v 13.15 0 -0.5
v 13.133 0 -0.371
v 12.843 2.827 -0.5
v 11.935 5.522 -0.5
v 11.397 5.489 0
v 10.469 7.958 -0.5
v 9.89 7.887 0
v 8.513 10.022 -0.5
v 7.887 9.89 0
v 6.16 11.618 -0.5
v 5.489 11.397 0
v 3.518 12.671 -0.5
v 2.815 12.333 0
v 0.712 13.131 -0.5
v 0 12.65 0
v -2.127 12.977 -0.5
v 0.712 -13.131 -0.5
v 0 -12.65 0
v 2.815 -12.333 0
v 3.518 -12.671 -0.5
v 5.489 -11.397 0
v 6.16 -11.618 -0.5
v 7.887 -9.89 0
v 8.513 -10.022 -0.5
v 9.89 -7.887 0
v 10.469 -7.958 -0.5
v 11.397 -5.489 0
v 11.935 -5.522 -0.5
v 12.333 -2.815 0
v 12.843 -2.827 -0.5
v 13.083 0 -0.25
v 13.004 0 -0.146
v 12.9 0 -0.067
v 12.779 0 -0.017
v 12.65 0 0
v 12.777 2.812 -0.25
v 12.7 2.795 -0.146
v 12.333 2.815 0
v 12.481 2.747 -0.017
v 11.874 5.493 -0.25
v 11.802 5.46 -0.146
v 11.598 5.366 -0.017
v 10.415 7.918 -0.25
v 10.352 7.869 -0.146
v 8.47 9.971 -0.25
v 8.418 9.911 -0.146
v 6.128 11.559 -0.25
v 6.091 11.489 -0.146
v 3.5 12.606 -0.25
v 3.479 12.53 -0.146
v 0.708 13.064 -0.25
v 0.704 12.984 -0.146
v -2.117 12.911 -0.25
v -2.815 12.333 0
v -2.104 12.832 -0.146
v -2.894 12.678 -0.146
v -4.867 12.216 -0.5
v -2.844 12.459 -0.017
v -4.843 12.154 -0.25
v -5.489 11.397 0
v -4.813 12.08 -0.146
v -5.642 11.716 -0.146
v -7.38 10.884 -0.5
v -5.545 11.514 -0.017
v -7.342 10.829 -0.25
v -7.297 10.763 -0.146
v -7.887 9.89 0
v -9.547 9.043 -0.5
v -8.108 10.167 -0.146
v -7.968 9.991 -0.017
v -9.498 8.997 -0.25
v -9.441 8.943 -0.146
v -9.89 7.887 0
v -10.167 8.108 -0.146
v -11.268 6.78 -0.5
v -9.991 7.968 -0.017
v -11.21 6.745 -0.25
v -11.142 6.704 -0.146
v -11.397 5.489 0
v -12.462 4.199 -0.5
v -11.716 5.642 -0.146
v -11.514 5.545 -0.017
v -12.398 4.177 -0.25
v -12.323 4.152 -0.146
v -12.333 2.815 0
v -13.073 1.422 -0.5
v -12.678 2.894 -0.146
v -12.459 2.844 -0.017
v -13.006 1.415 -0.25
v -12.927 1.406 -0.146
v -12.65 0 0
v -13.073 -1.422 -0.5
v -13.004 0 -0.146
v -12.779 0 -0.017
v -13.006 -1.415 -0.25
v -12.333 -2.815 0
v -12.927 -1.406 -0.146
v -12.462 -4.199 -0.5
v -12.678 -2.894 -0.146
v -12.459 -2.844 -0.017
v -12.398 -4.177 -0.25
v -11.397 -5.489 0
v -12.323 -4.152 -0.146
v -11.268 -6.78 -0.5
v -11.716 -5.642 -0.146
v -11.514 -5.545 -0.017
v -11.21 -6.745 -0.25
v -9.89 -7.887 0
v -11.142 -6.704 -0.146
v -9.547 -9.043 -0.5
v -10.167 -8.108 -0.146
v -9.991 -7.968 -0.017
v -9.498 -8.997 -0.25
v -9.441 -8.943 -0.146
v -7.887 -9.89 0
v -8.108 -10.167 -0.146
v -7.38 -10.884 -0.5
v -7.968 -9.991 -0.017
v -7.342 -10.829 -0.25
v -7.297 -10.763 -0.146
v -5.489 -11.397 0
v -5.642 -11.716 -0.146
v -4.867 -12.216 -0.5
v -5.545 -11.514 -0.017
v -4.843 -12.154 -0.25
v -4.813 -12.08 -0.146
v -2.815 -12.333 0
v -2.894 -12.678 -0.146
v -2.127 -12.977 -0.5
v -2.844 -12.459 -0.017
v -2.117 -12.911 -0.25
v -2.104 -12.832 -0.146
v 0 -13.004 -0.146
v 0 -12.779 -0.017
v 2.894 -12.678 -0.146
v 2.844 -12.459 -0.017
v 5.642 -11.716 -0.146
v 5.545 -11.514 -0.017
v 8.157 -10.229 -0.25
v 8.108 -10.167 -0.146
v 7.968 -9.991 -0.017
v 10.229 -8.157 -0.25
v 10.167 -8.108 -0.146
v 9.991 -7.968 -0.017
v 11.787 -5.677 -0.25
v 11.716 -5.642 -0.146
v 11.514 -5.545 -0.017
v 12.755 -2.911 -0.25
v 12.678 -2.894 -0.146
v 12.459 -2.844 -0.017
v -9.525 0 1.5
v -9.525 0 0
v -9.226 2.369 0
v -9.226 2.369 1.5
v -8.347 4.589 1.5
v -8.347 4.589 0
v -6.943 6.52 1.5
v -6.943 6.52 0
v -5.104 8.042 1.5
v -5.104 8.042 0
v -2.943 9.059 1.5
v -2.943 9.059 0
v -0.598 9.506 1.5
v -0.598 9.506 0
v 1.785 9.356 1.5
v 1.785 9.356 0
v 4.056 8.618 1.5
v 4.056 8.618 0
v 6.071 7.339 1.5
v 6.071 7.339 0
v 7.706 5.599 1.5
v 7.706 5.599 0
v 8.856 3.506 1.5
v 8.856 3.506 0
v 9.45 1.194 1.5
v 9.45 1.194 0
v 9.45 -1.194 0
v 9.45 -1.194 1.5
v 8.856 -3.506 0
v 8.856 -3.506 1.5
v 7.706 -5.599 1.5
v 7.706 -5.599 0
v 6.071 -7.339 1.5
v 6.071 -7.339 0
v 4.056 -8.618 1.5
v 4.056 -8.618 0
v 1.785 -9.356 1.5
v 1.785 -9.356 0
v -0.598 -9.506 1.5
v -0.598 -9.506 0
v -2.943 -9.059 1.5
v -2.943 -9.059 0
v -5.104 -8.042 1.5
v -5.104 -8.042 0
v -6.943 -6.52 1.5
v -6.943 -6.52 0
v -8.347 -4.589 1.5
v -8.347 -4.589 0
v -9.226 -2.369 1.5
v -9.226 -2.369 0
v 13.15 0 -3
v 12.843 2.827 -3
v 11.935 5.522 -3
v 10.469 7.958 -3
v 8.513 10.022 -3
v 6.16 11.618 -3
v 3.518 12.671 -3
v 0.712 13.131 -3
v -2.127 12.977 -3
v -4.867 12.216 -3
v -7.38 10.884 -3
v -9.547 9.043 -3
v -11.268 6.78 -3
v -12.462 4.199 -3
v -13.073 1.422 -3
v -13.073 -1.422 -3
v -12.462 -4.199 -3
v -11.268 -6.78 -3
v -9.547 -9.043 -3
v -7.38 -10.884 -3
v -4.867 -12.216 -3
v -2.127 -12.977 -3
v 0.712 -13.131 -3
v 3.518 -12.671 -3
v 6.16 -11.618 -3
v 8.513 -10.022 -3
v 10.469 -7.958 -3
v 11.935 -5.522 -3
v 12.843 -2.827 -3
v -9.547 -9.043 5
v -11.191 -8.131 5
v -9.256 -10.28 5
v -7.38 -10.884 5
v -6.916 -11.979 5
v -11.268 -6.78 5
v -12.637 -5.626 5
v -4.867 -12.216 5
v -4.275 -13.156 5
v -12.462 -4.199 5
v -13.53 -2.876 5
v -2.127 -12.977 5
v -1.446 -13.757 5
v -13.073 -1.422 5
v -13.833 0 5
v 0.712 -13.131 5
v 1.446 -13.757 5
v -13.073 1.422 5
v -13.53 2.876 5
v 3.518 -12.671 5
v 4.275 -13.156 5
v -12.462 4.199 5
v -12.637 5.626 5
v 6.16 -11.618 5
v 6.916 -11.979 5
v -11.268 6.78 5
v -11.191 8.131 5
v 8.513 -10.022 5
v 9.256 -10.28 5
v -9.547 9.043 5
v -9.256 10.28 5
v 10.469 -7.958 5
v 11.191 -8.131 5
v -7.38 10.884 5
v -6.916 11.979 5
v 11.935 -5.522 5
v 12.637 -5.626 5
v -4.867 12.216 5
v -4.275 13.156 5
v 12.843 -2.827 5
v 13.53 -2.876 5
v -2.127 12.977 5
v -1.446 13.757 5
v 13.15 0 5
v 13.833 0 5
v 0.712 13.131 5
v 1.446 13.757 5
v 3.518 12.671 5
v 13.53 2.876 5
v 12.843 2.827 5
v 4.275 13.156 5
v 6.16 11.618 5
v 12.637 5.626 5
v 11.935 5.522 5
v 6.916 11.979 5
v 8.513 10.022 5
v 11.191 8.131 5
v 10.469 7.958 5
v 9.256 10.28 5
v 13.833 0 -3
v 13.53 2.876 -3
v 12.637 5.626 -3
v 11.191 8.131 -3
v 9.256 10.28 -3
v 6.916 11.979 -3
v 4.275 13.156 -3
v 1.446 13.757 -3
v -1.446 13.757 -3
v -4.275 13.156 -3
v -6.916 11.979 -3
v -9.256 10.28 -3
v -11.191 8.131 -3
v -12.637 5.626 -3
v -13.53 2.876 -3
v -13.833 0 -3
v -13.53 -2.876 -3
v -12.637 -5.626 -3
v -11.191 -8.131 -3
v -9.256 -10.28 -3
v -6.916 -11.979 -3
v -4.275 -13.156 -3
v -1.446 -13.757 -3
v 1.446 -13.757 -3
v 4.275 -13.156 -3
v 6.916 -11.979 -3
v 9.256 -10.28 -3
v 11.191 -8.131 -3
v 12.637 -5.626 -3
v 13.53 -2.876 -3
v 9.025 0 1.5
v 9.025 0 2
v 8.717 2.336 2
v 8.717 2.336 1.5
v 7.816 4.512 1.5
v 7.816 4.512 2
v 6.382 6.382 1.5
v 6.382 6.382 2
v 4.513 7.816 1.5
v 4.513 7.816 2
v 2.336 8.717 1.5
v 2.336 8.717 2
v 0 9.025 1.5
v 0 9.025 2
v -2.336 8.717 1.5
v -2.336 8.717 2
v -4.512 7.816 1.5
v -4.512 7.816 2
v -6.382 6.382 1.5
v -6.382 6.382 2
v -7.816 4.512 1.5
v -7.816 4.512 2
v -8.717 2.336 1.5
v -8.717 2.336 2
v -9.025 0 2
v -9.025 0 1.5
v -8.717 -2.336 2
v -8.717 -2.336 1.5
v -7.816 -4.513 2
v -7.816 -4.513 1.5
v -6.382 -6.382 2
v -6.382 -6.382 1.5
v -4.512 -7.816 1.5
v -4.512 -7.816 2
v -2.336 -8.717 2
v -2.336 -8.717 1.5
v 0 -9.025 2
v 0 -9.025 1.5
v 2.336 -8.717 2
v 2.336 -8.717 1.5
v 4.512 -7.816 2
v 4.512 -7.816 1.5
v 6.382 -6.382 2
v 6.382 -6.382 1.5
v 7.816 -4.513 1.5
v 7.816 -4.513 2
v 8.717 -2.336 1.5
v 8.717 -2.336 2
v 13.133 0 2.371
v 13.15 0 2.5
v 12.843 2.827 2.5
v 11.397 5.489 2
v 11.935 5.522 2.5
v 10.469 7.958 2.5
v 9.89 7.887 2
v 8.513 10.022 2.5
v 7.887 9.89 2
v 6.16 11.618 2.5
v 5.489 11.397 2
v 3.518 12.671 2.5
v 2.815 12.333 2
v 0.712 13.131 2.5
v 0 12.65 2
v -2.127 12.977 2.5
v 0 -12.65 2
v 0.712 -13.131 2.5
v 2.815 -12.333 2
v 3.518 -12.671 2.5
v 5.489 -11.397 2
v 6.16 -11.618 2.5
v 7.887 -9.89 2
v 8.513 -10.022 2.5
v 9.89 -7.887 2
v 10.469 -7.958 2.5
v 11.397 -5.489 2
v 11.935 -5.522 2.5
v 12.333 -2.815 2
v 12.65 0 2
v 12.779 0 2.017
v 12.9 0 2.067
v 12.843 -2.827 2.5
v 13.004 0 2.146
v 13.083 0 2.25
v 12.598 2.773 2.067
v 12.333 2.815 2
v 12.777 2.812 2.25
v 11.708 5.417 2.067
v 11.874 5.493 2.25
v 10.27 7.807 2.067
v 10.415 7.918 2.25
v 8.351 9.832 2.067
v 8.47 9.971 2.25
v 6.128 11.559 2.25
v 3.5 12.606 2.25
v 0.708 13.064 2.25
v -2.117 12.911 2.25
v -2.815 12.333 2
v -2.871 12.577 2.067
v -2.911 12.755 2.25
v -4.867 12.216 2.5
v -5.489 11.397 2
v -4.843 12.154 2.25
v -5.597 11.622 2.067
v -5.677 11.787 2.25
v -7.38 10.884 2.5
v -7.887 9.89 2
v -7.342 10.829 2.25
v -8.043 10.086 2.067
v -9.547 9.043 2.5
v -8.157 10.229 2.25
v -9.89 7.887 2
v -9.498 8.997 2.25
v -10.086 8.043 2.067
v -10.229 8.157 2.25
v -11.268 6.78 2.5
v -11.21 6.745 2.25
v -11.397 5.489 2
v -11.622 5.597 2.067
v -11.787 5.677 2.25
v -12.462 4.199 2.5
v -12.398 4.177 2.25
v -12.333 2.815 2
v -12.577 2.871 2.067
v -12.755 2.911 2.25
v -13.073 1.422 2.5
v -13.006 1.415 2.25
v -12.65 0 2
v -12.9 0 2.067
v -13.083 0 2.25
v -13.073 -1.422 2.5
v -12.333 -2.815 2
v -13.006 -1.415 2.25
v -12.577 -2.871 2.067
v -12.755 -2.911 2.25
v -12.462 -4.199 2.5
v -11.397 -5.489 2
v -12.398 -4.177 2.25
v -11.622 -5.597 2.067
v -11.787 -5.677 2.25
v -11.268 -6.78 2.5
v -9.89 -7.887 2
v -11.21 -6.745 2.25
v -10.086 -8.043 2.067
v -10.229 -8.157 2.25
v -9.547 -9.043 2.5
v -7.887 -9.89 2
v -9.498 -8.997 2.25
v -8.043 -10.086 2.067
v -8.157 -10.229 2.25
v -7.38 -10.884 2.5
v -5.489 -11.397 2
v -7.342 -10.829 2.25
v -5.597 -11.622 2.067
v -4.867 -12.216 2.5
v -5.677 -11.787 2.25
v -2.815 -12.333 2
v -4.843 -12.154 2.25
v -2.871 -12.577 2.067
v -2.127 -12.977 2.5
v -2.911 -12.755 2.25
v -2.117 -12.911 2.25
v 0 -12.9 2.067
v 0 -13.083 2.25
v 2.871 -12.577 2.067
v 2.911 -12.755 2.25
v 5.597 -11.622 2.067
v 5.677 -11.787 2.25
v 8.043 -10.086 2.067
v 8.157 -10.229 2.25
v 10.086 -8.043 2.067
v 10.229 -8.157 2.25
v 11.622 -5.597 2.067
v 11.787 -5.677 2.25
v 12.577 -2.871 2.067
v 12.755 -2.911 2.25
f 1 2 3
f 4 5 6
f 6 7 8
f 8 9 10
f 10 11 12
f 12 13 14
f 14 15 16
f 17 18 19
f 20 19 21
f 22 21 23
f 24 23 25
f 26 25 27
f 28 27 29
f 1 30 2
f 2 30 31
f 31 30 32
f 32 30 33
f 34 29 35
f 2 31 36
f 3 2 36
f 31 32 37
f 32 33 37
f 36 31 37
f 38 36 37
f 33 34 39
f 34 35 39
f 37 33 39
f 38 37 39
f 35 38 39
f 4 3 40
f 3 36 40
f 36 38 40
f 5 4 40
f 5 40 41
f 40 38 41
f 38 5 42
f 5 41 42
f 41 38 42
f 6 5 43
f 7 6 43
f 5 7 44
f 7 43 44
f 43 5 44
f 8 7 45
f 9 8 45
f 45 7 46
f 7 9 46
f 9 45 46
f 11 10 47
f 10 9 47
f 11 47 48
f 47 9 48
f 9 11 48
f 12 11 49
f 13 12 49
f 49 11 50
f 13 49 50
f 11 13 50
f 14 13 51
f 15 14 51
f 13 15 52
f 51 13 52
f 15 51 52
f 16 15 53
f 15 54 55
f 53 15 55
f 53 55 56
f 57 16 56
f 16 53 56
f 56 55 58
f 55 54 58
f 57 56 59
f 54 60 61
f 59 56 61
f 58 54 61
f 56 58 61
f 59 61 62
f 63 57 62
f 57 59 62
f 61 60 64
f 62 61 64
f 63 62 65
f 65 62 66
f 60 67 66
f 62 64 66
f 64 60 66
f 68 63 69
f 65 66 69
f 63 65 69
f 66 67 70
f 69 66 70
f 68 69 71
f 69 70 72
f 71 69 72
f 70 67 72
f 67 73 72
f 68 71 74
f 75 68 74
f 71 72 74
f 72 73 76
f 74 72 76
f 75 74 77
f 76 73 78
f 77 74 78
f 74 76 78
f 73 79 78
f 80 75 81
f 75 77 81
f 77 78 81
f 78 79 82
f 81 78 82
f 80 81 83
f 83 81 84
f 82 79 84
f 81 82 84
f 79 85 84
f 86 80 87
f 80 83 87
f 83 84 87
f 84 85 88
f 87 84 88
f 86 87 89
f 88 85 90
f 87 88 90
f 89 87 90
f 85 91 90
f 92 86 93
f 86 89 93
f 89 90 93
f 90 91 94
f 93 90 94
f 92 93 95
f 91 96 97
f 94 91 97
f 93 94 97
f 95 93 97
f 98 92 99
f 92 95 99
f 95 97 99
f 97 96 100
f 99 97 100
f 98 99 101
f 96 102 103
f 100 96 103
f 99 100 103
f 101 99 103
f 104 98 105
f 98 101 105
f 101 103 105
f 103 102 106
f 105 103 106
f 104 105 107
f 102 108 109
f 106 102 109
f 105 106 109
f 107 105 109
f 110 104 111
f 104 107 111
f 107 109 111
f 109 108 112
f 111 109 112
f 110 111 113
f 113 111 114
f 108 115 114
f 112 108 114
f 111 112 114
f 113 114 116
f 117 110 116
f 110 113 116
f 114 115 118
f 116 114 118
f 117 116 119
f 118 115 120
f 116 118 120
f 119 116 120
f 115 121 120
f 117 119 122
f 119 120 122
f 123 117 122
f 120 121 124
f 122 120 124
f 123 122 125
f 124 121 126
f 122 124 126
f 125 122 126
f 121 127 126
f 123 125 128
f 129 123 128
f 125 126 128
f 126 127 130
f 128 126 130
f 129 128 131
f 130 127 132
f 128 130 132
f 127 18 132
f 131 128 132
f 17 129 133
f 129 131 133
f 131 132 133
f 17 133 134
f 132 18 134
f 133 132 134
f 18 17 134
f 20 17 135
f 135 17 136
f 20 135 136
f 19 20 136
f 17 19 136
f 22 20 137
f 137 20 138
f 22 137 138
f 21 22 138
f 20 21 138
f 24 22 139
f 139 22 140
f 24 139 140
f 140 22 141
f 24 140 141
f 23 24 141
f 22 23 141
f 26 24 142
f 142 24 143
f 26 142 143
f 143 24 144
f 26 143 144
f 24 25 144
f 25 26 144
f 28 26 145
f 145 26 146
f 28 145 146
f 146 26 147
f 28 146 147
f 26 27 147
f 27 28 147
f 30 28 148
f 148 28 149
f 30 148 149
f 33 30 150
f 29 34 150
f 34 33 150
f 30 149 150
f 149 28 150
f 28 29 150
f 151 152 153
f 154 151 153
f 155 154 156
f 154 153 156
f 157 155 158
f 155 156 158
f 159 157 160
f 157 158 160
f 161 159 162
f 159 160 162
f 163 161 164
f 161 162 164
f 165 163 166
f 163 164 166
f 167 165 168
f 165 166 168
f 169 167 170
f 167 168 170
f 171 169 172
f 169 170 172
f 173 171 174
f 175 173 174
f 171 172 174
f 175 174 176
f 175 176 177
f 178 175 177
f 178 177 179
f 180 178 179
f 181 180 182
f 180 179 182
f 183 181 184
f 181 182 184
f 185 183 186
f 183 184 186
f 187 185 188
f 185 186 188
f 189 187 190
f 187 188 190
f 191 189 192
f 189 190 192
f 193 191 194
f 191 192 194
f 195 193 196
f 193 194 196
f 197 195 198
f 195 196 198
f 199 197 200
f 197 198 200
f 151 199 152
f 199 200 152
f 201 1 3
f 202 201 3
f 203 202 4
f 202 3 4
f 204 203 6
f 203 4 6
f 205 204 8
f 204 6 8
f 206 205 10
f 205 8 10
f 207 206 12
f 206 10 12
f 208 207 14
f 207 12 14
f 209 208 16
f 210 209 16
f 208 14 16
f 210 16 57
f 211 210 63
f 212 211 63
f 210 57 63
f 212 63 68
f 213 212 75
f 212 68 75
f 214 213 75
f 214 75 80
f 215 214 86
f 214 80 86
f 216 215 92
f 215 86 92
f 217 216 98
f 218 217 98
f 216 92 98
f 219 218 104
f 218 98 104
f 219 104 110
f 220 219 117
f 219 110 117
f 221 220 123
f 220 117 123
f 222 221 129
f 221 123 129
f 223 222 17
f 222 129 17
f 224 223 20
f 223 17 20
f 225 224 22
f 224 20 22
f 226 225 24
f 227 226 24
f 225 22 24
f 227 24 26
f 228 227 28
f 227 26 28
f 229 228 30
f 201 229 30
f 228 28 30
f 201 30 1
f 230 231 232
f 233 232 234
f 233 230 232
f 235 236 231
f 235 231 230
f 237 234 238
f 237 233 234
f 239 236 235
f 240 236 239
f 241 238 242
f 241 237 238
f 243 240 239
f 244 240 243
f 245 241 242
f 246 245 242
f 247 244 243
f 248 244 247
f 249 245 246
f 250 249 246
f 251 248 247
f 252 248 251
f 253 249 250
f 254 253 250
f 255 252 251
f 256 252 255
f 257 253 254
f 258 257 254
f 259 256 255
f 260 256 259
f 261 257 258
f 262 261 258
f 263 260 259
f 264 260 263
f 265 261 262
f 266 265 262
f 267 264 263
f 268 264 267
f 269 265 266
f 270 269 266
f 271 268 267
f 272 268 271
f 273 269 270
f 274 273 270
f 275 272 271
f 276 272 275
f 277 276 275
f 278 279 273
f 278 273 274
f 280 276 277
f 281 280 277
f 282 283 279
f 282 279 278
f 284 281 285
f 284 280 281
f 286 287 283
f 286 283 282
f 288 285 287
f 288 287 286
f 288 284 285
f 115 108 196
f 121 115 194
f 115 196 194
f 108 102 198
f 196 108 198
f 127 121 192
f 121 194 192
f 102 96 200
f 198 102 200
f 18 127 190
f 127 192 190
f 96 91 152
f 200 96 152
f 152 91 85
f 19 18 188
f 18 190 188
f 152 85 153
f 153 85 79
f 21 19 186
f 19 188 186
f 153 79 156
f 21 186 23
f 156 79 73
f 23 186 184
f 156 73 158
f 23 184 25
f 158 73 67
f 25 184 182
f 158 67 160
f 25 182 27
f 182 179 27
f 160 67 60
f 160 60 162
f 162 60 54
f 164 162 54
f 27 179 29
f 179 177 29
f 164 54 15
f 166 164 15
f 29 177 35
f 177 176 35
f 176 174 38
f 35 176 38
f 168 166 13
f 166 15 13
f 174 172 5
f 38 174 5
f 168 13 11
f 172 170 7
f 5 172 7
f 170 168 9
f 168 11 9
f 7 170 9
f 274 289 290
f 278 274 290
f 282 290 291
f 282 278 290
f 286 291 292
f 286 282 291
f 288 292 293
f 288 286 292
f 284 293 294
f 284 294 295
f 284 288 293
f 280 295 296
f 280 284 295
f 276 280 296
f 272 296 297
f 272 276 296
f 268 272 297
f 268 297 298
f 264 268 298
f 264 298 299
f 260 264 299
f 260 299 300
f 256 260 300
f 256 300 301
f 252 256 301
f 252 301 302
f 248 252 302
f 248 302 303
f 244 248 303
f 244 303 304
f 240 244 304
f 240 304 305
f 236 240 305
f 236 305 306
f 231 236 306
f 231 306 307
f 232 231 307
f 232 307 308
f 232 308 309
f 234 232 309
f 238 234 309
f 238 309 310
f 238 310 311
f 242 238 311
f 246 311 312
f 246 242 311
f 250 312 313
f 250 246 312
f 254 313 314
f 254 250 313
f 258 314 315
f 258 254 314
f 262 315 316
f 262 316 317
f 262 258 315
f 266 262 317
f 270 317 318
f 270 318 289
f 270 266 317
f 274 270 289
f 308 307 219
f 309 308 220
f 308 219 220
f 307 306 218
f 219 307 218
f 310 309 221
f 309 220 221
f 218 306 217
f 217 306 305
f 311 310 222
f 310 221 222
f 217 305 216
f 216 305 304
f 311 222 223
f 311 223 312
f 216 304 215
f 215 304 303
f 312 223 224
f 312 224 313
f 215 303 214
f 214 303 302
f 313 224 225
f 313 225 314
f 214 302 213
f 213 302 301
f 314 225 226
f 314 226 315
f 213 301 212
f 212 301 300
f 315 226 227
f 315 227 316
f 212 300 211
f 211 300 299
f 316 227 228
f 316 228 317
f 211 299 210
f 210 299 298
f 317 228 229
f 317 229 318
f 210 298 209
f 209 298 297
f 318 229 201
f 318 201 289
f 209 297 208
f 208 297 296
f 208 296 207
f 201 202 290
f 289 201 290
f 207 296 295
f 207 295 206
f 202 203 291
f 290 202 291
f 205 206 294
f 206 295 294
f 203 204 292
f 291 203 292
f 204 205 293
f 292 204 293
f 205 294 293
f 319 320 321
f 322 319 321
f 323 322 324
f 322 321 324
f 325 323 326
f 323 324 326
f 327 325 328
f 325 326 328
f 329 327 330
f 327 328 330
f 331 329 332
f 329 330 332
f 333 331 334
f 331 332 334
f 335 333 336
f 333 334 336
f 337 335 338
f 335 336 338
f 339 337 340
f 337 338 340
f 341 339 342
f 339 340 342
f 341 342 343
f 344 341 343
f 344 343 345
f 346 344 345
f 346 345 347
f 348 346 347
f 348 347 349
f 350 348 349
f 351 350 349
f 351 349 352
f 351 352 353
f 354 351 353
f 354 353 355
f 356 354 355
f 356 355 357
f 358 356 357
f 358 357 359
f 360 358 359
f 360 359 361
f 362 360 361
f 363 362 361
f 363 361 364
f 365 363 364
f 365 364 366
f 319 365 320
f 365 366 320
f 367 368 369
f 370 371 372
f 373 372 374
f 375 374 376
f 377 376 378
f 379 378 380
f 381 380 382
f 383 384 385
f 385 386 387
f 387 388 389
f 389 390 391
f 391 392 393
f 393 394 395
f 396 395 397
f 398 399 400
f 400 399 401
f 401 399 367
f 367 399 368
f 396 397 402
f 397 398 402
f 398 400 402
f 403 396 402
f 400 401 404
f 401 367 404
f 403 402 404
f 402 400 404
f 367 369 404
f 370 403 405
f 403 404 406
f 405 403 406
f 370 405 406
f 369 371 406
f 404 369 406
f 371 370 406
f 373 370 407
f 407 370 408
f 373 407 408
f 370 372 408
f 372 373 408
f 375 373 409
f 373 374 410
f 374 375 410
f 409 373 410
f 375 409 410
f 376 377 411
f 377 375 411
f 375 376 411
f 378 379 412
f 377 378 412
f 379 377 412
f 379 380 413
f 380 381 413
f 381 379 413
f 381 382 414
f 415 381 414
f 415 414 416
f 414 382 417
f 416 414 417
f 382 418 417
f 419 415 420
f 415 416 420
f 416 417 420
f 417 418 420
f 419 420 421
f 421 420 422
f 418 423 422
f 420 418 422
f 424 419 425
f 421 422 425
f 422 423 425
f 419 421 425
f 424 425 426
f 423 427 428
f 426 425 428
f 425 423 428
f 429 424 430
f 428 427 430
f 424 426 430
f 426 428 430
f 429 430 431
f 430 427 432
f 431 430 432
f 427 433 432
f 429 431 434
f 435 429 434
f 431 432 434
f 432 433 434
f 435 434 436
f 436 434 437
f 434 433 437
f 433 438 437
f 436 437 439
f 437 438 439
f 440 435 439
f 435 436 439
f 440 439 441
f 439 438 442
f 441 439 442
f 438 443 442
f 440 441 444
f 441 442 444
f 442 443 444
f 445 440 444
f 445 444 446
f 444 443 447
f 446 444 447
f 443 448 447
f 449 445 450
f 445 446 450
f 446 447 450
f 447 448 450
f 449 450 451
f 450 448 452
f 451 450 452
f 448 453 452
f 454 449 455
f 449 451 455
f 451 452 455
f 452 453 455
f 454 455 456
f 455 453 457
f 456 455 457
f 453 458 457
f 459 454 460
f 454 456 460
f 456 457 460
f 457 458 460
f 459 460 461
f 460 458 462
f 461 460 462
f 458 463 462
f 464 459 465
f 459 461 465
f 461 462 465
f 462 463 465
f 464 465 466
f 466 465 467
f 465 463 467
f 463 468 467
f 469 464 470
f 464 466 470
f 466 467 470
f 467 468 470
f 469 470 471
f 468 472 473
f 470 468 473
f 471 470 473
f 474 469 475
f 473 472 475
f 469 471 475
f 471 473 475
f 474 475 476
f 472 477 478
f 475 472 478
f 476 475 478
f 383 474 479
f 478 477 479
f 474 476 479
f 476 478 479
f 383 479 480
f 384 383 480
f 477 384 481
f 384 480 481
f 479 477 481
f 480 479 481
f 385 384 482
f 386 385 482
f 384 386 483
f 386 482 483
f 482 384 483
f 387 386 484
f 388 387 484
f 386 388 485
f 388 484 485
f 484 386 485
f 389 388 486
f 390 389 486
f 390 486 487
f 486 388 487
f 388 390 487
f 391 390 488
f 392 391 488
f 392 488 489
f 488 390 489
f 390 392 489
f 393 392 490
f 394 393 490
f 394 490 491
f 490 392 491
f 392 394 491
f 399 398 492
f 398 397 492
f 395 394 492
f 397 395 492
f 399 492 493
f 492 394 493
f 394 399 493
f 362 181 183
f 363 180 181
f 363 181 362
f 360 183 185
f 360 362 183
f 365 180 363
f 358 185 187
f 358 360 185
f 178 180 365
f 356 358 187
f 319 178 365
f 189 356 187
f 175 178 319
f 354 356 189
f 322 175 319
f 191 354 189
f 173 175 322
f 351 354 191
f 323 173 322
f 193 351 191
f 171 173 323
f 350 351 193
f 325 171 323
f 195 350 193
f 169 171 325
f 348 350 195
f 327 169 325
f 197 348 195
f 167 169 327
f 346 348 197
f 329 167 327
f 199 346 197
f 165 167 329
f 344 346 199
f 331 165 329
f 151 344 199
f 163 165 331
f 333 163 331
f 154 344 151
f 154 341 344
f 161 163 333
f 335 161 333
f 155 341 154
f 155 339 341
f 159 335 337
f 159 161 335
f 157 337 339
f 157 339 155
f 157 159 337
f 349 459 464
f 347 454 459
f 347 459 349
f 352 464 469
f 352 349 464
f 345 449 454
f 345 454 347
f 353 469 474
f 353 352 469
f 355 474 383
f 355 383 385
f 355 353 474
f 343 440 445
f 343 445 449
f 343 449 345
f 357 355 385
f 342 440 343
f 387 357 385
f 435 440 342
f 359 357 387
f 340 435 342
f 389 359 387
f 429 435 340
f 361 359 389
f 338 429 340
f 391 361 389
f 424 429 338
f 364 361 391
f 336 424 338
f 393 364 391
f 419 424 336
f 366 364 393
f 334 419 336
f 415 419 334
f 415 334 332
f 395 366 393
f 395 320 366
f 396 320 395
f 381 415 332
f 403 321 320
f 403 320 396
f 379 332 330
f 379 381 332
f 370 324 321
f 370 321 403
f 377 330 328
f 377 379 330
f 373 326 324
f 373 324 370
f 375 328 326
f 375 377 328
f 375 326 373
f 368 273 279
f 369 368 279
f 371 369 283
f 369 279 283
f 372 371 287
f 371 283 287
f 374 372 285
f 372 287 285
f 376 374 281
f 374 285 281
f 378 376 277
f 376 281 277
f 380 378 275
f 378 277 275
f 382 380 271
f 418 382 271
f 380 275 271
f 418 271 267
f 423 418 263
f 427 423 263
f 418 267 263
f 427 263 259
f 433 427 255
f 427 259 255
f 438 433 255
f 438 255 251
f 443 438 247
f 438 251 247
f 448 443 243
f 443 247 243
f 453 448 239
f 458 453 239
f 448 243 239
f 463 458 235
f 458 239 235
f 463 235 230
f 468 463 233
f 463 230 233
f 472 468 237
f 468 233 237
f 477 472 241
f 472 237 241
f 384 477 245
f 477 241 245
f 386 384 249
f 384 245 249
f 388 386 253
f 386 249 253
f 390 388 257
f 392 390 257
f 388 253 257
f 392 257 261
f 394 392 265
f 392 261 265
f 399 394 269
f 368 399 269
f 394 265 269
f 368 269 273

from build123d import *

# Parameters (mm, degrees)
SKETCH1_R           = 13.8327
SKETCH1_R_2         = 13.15
BOSS_EXTRUDE1_DEPTH = 3
BOSS_EXTRUDE2_START = 2
SKETCH2_R           = 13.8327
SKETCH2_R_2         = 9.025
BOSS_EXTRUDE2_DEPTH = 2
BOSS_EXTRUDE3_START = 3
SKETCH3_R           = 13.8327
SKETCH3_R_2         = 13.15
BOSS_EXTRUDE3_DEPTH = 3
FILLET1_R           = 0.5
SKETCH4_R           = 9.525
CUT_EXTRUDE2_DEPTH  = 1.5


with BuildPart() as part:
    # Sketch1 → Boss-Extrude1 (new body)
    with BuildSketch(Plane.XY):
        Circle(SKETCH1_R)
        Circle(SKETCH1_R_2, mode=Mode.SUBTRACT)
    extrude(amount=-BOSS_EXTRUDE1_DEPTH)

    # Sketch2 → Boss-Extrude2 (add)
    with BuildSketch(Plane.XY.offset(BOSS_EXTRUDE2_START)):
        Circle(SKETCH2_R)
        Circle(SKETCH2_R_2, mode=Mode.SUBTRACT)
    extrude(amount=-BOSS_EXTRUDE2_DEPTH)

    # Sketch3 → Boss-Extrude3 (add)
    with BuildSketch(Plane.XY.offset(2).offset(BOSS_EXTRUDE3_START)):
        Circle(SKETCH3_R)
        Circle(SKETCH3_R_2, mode=Mode.SUBTRACT)
    extrude(amount=-BOSS_EXTRUDE3_DEPTH)

    # Fillet1
    fillet1_edges = [part.edges().sort_by_distance(p)[0] for p in [
        (-13.15, 0, 0),
        (-13.15, 0, 2),
    ]]
    fillet(fillet1_edges, radius=FILLET1_R)

    # Sketch4 → Cut-Extrude2 (cut)
    with BuildSketch(Plane(origin=(0, 0, 0), x_dir=(-1, 0, 0), z_dir=(0, 0, -1))):
        Circle(SKETCH4_R)
    extrude(amount=-CUT_EXTRUDE2_DEPTH, mode=Mode.SUBTRACT)


solid = part.part
